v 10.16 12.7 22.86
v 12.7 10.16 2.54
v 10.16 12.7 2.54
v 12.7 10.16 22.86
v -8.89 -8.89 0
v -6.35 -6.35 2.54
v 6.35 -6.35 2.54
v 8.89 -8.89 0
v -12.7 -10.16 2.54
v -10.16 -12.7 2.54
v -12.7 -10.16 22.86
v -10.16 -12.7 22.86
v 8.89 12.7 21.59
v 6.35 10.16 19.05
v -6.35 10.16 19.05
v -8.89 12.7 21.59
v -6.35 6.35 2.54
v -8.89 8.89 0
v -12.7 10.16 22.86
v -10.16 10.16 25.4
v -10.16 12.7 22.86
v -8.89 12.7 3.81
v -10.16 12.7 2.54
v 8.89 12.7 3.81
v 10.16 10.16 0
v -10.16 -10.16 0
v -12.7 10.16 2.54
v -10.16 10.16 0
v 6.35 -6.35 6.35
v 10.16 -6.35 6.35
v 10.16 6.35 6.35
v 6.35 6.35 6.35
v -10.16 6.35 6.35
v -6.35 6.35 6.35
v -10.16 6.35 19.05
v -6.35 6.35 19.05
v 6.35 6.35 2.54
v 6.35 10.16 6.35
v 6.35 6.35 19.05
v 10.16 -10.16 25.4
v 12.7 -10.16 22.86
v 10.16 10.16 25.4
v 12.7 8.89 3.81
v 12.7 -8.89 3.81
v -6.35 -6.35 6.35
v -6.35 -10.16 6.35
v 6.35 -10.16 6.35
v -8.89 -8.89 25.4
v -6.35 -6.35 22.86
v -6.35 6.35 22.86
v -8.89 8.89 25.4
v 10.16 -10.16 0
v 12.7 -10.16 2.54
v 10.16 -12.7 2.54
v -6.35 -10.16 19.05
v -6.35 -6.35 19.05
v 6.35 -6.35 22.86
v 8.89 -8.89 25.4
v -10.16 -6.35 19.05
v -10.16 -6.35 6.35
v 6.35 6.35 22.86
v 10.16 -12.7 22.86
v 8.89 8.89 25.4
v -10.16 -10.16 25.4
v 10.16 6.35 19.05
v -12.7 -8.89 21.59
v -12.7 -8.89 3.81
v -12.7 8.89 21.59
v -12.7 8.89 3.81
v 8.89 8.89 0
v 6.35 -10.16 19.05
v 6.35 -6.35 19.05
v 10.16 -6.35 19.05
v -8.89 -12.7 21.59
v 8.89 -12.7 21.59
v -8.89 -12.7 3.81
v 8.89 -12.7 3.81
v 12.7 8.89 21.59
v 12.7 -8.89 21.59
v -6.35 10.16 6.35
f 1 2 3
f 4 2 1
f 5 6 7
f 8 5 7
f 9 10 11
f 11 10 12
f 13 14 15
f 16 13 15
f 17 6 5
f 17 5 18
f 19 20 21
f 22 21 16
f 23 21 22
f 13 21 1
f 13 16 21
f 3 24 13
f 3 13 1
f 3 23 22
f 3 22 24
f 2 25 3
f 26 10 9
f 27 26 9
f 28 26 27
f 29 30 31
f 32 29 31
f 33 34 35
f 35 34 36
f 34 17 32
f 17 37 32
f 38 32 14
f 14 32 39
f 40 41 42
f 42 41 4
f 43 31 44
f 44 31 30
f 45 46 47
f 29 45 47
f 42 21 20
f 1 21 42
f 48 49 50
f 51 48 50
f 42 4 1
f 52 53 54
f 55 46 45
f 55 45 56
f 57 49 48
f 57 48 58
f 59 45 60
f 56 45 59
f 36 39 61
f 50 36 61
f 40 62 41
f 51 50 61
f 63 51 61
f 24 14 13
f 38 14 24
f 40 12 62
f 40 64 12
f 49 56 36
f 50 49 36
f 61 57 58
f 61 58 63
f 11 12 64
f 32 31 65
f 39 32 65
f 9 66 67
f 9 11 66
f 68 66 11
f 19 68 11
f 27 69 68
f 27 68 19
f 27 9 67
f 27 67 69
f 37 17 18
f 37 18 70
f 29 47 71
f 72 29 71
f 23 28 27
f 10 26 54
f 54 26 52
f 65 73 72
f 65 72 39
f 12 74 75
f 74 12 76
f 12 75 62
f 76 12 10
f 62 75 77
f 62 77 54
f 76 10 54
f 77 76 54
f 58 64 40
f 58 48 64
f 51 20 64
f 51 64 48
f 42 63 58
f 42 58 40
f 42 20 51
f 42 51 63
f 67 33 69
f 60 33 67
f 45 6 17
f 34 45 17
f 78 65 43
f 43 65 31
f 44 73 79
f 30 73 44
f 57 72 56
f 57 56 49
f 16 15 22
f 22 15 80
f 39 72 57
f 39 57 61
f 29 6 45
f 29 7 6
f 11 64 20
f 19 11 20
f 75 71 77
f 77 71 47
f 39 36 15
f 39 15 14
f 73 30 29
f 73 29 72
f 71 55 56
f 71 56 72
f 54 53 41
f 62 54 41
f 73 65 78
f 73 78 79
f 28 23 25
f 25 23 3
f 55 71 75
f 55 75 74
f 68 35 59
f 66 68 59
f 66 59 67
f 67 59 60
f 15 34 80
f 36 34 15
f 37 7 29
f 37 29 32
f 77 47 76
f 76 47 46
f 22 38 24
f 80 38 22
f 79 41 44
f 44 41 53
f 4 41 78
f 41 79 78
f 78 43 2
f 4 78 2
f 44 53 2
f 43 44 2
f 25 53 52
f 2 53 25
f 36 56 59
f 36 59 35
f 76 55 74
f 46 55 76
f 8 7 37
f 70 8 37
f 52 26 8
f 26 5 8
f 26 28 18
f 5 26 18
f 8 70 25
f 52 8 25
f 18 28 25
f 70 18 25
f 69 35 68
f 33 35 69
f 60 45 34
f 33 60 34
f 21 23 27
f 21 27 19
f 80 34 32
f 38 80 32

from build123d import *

# Parameters (mm, degrees)
F0_W     = 25.4
F0_H     = 25.4
F0_W_2   = 12.7
F0_H_2   = 12.7
F1_DEPTH = 25.4
F2_W     = 12.7
F2_H     = 12.7
F3_DEPTH = 43.942
F4_W     = 12.7
F4_H     = 12.7
F5_DEPTH = 39.116
F6_SIZE  = 2.54
F7_SIZE  = 2.54


with BuildPart() as f1:
    # F0 (on Top) → F1 (new body)
    with BuildSketch(Plane.XY):
        Rectangle(F0_W, F0_H)
        Rectangle(F0_W_2, F0_H_2, mode=Mode.SUBTRACT)
    extrude(amount=F1_DEPTH)

    # F2 (on Right) → F3 (cut, symmetric)
    with BuildSketch(Plane.YZ):
        with Locations((0, 12.7)):
            Rectangle(F2_W, F2_H)
    extrude(amount=F3_DEPTH, both=True, mode=Mode.SUBTRACT)

    # F4 (on Front) → F5 (cut, symmetric)
    with BuildSketch(Plane.XZ):
        with Locations((0, 12.7)):
            Rectangle(F4_W, F4_H)
    extrude(amount=F5_DEPTH, both=True, mode=Mode.SUBTRACT)

    # F6
    f6_edges = [f1.edges().sort_by_distance(p)[0] for p in [
        (0, -6.35, 0),
        (-6.35, 0, 0),
        (0, 6.35, 0),
        (6.35, 0, 0),
        (12.7, 6.35, 12.7),
        (12.7, 0, 19.05),
        (12.7, -6.35, 12.7),
        (12.7, 0, 6.35),
        (-12.7, -6.35, 12.7),
        (-12.7, 0, 19.05),
        (-12.7, 0, 6.35),
        (-12.7, 6.35, 12.7),
        (0, -6.35, 25.4),
        (-6.35, 0, 25.4),
        (0, 6.35, 25.4),
        (6.35, 0, 25.4),
        (6.35, 12.7, 12.7),
        (0, 12.7, 19.05),
        (0, 12.7, 6.35),
        (-6.35, 12.7, 12.7),
        (0, -12.7, 19.05),
        (6.35, -12.7, 12.7),
        (0, -12.7, 6.35),
        (-6.35, -12.7, 12.7),
    ]]
    chamfer(f6_edges, length=F6_SIZE)

    # F7
    f7_edges = [f1.edges().sort_by_distance(p)[0] for p in [
        (12.7, 0, 0),
        (12.7, -12.7, 12.7),
        (0, -12.7, 0),
        (0, -12.7, 25.4),
        (-12.7, -12.7, 12.7),
        (-12.7, 0, 0),
        (0, 12.7, 0),
        (12.7, 12.7, 12.7),
        (12.7, 0, 25.4),
        (0, 12.7, 25.4),
        (-12.7, 0, 25.4),
        (-12.7, 12.7, 12.7),
    ]]
    chamfer(f7_edges, length=F7_SIZE)


solid = f1.part
